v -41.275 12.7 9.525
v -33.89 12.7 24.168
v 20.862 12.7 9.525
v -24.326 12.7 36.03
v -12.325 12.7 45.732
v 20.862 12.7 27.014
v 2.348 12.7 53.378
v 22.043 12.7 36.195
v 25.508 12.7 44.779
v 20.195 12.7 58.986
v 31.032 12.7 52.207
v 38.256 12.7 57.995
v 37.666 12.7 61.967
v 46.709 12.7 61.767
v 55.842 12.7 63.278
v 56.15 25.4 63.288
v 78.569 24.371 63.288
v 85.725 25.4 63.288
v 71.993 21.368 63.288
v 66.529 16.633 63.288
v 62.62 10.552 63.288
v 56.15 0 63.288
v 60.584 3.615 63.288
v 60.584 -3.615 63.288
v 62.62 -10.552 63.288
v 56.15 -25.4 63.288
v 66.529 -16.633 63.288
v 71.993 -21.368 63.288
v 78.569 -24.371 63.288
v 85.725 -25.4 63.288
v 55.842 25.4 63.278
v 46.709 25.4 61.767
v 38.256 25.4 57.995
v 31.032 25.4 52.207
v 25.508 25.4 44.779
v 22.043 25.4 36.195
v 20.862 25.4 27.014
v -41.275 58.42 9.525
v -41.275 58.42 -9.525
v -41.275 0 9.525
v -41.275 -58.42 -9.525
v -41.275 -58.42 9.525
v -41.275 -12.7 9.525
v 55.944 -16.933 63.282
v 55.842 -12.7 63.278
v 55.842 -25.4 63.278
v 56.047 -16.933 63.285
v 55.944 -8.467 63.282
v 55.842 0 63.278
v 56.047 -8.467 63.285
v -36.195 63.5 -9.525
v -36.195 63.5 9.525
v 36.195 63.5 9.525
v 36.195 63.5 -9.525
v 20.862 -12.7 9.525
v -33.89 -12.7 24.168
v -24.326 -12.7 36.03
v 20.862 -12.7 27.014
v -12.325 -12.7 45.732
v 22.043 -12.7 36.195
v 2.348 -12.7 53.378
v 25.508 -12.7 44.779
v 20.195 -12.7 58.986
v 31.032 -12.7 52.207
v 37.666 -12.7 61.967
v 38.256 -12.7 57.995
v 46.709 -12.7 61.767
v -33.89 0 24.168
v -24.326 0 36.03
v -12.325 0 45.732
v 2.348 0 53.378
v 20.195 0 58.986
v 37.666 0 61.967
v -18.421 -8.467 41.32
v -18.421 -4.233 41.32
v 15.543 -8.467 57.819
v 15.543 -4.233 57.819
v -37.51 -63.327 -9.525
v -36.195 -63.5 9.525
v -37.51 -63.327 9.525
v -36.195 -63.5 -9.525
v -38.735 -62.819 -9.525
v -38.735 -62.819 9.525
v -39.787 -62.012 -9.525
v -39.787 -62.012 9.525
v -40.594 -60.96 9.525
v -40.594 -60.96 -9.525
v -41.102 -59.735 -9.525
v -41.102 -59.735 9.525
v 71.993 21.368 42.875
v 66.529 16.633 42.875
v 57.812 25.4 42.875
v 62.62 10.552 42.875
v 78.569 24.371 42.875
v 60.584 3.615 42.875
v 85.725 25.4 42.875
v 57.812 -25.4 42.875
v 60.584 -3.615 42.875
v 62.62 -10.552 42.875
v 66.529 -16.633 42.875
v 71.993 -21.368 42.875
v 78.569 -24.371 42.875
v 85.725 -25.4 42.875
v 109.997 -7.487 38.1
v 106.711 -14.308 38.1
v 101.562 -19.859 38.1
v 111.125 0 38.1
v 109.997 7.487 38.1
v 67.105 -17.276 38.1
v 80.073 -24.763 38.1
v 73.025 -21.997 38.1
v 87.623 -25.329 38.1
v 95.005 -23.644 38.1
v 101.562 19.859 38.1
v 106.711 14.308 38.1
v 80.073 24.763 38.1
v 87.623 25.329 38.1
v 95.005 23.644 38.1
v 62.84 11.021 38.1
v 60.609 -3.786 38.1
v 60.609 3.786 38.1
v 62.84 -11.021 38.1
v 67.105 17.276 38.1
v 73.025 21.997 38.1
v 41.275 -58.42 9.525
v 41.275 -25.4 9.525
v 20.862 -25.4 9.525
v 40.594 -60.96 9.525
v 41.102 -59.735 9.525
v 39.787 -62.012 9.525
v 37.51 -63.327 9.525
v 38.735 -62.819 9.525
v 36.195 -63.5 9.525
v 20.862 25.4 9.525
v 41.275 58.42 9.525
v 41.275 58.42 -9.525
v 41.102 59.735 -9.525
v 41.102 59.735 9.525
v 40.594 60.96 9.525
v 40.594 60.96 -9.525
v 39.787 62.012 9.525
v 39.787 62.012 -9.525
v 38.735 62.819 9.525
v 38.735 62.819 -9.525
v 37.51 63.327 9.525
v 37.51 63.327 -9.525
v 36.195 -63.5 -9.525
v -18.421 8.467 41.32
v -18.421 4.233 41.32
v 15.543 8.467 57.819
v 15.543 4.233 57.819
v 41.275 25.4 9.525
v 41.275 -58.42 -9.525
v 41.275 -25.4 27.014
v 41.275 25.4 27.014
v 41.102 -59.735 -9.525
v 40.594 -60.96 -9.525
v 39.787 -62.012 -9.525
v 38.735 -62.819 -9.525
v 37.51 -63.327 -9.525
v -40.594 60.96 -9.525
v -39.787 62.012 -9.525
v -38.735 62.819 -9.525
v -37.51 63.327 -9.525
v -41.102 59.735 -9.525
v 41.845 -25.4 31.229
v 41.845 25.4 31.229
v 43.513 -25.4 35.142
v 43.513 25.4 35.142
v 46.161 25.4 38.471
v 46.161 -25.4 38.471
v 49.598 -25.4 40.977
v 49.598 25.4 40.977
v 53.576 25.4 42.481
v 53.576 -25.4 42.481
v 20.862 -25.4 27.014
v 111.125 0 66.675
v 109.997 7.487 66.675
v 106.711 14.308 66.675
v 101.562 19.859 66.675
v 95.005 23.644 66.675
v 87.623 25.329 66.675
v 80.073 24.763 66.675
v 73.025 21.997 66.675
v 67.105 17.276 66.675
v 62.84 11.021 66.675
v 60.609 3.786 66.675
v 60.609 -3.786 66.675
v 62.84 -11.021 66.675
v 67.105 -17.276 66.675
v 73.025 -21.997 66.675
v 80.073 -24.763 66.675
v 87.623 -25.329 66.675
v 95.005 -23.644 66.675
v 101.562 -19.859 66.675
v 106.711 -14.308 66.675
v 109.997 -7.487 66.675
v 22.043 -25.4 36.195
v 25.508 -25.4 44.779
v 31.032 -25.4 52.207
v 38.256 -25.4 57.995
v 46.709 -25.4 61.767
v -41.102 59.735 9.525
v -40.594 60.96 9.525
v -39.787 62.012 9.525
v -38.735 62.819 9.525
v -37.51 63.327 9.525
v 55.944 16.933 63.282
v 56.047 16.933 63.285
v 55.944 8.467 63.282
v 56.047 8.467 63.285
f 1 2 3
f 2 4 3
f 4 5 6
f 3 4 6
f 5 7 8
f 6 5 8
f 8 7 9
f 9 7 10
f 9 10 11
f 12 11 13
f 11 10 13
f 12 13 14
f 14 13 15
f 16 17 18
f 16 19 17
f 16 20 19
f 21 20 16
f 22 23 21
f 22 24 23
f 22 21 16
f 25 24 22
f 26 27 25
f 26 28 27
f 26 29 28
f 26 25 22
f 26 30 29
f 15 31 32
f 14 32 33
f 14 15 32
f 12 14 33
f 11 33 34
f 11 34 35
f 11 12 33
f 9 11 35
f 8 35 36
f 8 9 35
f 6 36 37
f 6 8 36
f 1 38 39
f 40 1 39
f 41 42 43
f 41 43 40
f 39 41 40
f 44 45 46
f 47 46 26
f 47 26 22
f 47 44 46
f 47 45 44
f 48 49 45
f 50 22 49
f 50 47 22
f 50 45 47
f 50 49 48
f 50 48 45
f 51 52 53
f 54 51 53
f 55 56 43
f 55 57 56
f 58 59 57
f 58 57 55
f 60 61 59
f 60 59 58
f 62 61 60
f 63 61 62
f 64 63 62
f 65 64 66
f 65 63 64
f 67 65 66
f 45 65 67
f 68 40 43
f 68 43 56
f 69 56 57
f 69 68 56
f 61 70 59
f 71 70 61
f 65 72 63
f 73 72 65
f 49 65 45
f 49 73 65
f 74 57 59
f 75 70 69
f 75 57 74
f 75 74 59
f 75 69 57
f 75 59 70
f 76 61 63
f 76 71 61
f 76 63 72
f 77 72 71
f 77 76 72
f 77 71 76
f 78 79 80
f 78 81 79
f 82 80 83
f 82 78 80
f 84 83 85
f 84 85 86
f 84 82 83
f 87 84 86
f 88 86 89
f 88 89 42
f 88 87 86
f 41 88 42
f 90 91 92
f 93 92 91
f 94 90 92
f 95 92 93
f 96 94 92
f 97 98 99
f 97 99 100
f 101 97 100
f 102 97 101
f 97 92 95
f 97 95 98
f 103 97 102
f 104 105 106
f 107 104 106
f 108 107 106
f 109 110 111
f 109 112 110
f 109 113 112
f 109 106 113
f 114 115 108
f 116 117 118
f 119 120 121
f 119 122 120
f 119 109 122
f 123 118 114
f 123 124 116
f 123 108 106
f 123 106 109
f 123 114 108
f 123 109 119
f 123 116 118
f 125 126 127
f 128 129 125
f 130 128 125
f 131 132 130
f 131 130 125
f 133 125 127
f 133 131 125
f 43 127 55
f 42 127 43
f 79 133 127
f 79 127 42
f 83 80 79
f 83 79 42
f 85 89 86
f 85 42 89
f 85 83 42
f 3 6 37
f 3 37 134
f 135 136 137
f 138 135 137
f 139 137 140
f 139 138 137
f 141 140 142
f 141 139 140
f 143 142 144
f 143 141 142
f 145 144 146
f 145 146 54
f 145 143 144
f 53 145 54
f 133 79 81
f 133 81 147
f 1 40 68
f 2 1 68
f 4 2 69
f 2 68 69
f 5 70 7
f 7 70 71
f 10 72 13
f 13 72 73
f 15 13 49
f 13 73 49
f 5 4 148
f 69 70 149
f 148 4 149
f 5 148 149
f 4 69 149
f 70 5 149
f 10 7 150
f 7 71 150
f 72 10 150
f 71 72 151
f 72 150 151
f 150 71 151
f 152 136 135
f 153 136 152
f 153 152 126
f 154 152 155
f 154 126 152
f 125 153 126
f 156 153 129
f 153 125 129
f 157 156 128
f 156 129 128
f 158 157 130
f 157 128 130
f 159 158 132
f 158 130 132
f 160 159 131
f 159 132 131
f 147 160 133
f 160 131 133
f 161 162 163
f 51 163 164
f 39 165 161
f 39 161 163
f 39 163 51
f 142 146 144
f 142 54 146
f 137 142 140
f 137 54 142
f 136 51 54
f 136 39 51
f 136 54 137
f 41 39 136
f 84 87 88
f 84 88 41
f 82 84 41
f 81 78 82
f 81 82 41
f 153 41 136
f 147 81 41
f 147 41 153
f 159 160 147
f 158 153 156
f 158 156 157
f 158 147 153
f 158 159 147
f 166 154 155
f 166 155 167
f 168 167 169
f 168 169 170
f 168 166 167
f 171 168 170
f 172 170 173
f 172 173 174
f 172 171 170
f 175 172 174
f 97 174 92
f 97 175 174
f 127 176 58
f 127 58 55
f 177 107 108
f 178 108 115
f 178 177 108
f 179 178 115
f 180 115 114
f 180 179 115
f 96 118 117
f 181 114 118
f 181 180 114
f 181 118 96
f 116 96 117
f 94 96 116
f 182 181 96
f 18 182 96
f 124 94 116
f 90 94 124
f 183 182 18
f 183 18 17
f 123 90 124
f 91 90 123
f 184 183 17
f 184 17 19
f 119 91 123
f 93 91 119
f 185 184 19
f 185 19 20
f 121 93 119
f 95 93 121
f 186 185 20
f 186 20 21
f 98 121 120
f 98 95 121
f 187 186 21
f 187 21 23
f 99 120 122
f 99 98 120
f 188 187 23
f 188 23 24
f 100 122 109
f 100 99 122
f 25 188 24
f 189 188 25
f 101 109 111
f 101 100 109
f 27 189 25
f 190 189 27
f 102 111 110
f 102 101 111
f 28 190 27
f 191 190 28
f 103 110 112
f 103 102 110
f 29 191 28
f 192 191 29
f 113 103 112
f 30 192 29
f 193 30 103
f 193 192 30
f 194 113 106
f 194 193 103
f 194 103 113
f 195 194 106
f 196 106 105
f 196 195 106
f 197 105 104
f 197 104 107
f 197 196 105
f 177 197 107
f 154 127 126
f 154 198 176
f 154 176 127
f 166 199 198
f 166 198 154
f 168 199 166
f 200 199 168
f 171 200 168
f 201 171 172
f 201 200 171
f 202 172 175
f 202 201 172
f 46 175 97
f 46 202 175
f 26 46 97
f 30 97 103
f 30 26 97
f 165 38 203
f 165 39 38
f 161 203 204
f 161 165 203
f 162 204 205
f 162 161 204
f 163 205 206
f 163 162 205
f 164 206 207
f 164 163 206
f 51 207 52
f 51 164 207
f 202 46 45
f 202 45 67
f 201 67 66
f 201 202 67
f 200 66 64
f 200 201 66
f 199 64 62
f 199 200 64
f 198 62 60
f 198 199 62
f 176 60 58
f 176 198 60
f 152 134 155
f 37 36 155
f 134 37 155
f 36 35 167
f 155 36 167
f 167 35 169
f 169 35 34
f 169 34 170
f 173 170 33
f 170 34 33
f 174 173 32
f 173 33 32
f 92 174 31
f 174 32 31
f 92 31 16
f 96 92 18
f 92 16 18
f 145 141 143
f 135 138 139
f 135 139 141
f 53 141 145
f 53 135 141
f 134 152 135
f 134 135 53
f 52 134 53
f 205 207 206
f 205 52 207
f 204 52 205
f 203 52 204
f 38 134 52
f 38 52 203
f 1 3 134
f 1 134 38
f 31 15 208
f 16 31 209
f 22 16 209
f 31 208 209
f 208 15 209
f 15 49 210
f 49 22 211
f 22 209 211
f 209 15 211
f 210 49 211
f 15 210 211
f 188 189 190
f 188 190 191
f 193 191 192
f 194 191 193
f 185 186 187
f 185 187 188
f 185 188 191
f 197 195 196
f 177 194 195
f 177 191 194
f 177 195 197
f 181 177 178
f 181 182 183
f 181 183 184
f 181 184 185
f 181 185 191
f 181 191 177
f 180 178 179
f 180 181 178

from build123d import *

# Parameters (mm, degrees)
F1_DEPTH = 63.5
F2_DEPTH = 25.4
F3_DEPTH = 12.7
F5_R     = 5.08


with BuildPart() as f1:
    # F0 (on Front) → F1 (new body, symmetric)
    with BuildSketch(Plane.XZ):
        Polygon((41.275, -9.525), (41.275, 9.525), (20.8620596677, 9.525), (-41.275, 9.525), (-41.275, -9.525), align=None)
    extrude(amount=F1_DEPTH, both=True)

    # F0 (on Front) → F2 (join, symmetric)
    with BuildSketch(Plane.XZ):
        with BuildLine():
            Line((20.8620596677, 9.525), (41.275, 9.525))
            Line((41.275, 9.525), (41.275, 27.0139881611))
            ThreePointArc((41.275, 27.0139881611), (46.1610443741, 38.4707974574), (57.8115013232, 42.8752))
            Line((57.8115013232, 42.8752), (60.325, 42.8752))
            Line((60.325, 42.8752), (60.325, 63.2881403323))
            Line((60.325, 63.2881403323), (56.1497511215, 63.2881403323))
            add(Edge.make_bspline(
                [(55.8418284891, 63.2783411935), (55.9444554247, 63.281668613), (56.0470964076, 63.2849348987), (56.1497511215, 63.2881403323)],
                knots=[111.0026419847, 111.0026419847, 111.0026419847, 111.0026419847, 111.2746933919, 111.2746933919, 111.2746933919, 111.2746933919], degree=3))
            ThreePointArc((55.8418284891, 63.2783411935), (31.03213769, 52.206683172), (20.8620596677, 27.0139881611))
            Line((20.8620596677, 27.0139881611), (20.8620596677, 9.525))
        make_face()
        Polygon((60.325, 63.2881403323), (60.325, 42.8752), (85.725, 42.8752), (85.725, 52.3875), (85.725, 63.2881403323), align=None)
    extrude(amount=F2_DEPTH, both=True)

    # F0 (on Front) → F3 (join, symmetric)
    with BuildSketch(Plane.XZ):
        with BuildLine():
            Line((-41.275, 9.525), (20.8620596677, 9.525))
            Line((20.8620596677, 9.525), (20.8620596677, 27.0139881611))
            ThreePointArc((20.8620596677, 27.0139881611), (31.03213769, 52.206683172), (55.8418284891, 63.2783411935))
            add(Edge.make_bspline(
                [(-41.275, 9.525), (-25.5674248784, 50.3853946243), (13.9679006475, 61.920684693), (55.8418284891, 63.2783411935)],
                knots=[0, 0, 0, 0, 111.0026419847, 111.0026419847, 111.0026419847, 111.0026419847], degree=3))
        make_face()
    extrude(amount=F3_DEPTH, both=True)

    # F0 (on Front) → F4 (revolve)
    with BuildSketch(Plane.XZ):
        Polygon((85.725, 52.3875), (85.725, 42.8752), (85.725, 38.1), (111.125, 38.1), (111.125, 66.675), (85.725, 66.675), (85.725, 63.2881403323), align=None)
    revolve(axis=Axis((85.725, 0, 54.7751), (0, 0, 1)))

    # F5
    f5_edges = [f1.edges().sort_by_distance(p)[0] for p in [
        (41.275, -63.5, 0),
        (-41.275, -63.5, 0),
        (-41.275, 63.5, 0),
        (41.275, 63.5, 0),
    ]]
    fillet(f5_edges, radius=F5_R)


solid = f1.part
